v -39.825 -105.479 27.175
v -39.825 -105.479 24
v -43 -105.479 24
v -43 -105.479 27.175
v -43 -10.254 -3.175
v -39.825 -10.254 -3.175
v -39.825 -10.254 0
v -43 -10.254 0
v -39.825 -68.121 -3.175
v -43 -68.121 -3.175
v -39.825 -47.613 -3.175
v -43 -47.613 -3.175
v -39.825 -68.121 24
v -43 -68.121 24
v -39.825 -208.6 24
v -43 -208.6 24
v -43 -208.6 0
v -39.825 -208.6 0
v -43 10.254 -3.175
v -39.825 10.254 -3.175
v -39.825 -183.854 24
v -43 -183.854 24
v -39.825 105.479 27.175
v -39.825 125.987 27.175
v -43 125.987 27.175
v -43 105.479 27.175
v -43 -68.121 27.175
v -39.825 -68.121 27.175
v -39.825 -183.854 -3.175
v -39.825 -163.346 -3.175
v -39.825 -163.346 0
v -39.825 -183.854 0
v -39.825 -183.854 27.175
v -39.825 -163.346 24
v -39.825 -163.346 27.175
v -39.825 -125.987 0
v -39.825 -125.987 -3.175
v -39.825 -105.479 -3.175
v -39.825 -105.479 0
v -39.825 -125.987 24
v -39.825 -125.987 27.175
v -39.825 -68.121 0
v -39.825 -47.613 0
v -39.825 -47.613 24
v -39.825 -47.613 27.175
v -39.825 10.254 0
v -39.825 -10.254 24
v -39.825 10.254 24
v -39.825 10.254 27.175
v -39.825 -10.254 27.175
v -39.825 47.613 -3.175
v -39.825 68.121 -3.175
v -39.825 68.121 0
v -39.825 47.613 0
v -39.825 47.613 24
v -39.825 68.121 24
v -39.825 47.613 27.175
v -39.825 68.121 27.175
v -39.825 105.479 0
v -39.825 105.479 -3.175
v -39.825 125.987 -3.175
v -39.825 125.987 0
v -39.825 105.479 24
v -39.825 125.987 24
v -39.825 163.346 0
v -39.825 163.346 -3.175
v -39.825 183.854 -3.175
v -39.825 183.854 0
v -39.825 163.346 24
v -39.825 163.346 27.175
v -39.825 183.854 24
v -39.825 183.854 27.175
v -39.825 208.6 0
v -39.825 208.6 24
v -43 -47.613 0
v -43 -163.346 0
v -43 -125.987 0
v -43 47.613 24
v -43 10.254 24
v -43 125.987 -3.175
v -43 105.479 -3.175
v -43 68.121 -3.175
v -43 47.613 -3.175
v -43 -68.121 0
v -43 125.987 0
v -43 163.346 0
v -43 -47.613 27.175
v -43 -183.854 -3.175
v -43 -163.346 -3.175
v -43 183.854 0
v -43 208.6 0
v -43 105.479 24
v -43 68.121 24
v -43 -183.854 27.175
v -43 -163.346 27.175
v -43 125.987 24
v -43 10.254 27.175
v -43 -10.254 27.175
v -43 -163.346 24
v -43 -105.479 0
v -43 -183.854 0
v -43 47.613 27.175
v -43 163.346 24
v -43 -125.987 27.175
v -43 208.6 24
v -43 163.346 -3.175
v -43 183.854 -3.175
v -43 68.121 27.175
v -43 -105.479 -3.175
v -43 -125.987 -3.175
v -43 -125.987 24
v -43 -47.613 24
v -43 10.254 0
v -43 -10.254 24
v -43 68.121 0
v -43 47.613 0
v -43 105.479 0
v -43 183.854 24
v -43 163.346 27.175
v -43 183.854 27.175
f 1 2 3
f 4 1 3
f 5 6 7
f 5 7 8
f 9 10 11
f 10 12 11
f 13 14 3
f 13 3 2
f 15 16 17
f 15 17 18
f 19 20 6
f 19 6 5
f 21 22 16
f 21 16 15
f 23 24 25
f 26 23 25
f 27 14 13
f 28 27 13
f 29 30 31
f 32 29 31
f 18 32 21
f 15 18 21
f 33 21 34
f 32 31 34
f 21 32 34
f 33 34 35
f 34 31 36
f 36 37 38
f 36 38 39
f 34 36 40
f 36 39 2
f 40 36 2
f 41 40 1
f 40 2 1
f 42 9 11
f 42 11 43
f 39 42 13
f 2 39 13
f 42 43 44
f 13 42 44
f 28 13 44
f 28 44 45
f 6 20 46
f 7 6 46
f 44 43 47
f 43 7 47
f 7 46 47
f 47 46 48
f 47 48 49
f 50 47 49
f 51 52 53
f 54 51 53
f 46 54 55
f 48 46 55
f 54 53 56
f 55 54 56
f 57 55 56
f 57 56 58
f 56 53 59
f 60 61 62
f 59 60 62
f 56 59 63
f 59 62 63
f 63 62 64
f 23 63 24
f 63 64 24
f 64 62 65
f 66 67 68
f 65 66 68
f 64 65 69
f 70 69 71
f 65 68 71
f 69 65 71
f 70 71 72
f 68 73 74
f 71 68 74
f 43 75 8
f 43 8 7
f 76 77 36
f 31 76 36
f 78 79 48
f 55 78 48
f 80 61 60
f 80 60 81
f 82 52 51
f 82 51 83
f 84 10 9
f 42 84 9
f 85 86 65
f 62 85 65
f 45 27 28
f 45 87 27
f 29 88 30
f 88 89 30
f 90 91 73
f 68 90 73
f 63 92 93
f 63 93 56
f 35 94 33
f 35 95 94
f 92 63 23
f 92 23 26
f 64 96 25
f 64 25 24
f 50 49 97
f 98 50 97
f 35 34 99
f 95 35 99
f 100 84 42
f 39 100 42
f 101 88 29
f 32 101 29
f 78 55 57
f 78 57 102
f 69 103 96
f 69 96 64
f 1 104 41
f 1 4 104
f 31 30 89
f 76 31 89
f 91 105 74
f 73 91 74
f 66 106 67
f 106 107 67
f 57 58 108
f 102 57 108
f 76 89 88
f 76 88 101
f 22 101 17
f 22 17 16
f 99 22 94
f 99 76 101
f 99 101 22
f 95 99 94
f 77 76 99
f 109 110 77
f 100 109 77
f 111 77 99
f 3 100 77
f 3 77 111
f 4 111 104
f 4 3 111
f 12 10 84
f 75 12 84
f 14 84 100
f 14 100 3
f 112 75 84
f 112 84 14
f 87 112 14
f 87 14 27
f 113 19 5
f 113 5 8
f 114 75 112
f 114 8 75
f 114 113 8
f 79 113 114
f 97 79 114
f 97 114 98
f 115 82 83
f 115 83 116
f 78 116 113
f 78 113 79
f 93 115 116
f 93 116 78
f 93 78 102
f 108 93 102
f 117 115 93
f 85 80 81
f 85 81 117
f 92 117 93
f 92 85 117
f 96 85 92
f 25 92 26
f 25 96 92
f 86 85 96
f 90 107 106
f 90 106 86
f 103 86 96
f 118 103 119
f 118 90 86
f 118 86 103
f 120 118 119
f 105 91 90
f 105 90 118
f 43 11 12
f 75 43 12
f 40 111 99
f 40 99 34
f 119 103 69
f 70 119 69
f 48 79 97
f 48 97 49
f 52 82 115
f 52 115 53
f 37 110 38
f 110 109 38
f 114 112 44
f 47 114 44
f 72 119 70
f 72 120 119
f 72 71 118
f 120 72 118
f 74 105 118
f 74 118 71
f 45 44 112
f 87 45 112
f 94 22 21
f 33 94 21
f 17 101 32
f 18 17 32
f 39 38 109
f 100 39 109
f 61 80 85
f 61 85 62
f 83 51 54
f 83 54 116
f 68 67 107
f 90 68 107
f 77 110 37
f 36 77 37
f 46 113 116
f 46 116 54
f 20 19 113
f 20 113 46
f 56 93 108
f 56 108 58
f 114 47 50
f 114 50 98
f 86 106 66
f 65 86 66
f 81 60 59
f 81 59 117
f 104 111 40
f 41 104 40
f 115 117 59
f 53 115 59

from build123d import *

# Parameters (mm, degrees)
BOSS_EXTRU_1_DEPTH        = 27.175
BOSS_EXTRU_1_DEPTH_BACK   = 3.175
BOSS_EXTRU_1_2_DEPTH      = 27.175
BOSS_EXTRU_1_2_DEPTH_BACK = 3.175
BOSS_EXTRU_1_3_DEPTH      = 27.175
BOSS_EXTRU_1_3_DEPTH_BACK = 3.175
BOSS_EXTRU_1_4_DEPTH      = 27.175
BOSS_EXTRU_1_4_DEPTH_BACK = 3.175
BOSS_EXTRU_1_5_DEPTH      = 27.175
BOSS_EXTRU_1_5_DEPTH_BACK = 3.175
BOSS_EXTRU_1_6_DEPTH      = 27.175
BOSS_EXTRU_1_6_DEPTH_BACK = 3.175
BOSS_EXTRU_1_7_DEPTH      = 27.175
BOSS_EXTRU_1_7_DEPTH_BACK = 3.175
BOSS_EXTRU_2_DEPTH        = 198.346
BOSS_EXTRU_2_DEPTH_BACK   = 218.854
ESQUISSE2_W               = 3.175
ESQUISSE2_H               = 24


with BuildPart() as part:
    # Esquisse1 → Boss.-Extru.1 (new, two sides: drawn at the far end of the back side and taken through both)
    with BuildSketch(Plane.XY.offset(-BOSS_EXTRU_1_DEPTH_BACK)):
        Polygon((-43, 163.6), (-43, 163.346), (-39.825, 163.346), (-39.825, 163.6), (-39.825, 183.6), (-39.825, 183.854), (-43, 183.854), (-43, 183.6), align=None)
    extrude(amount=BOSS_EXTRU_1_DEPTH + BOSS_EXTRU_1_DEPTH_BACK)



with BuildPart() as body_2:
    # Esquisse1 → Boss.-Extru.1 2 (new, two sides: drawn at the far end of the back side and taken through both)
    with BuildSketch(Plane.XY.offset(-BOSS_EXTRU_1_2_DEPTH_BACK)):
        Polygon((-43, 125.733333333), (-43, 125.987333333), (-39.825, 125.987333333), (-39.825, 125.733333333), (-39.825, 105.733333333), (-39.825, 105.479333333), (-43, 105.479333333), (-43, 105.733333333), align=None)
    extrude(amount=BOSS_EXTRU_1_2_DEPTH + BOSS_EXTRU_1_2_DEPTH_BACK)


with BuildPart() as body_3:
    # Esquisse1 → Boss.-Extru.1 3 (new, two sides: drawn at the far end of the back side and taken through both)
    with BuildSketch(Plane.XY.offset(-BOSS_EXTRU_1_3_DEPTH_BACK)):
        Polygon((-43, 67.866666667), (-43, 68.120666667), (-39.825, 68.120666667), (-39.825, 67.866666667), (-39.825, 47.866666667), (-39.825, 47.612666667), (-43, 47.612666667), (-43, 47.866666667), align=None)
    extrude(amount=BOSS_EXTRU_1_3_DEPTH + BOSS_EXTRU_1_3_DEPTH_BACK)


with BuildPart() as body_4:
    # Esquisse1 → Boss.-Extru.1 4 (new, two sides: drawn at the far end of the back side and taken through both)
    with BuildSketch(Plane.XY.offset(-BOSS_EXTRU_1_4_DEPTH_BACK)):
        Polygon((-43, 10), (-43, 10.254), (-39.825, 10.254), (-39.825, 10), (-39.825, -10), (-39.825, -10.254), (-43, -10.254), (-43, -10), align=None)
    extrude(amount=BOSS_EXTRU_1_4_DEPTH + BOSS_EXTRU_1_4_DEPTH_BACK)


with BuildPart() as body_5:
    # Esquisse1 → Boss.-Extru.1 5 (new, two sides: drawn at the far end of the back side and taken through both)
    with BuildSketch(Plane.XY.offset(-BOSS_EXTRU_1_5_DEPTH_BACK)):
        Polygon((-43, -163.6), (-43, -183.6), (-43, -183.854), (-39.825, -183.854), (-39.825, -183.6), (-39.825, -163.6), (-39.825, -163.346), (-43, -163.346), align=None)
    extrude(amount=BOSS_EXTRU_1_5_DEPTH + BOSS_EXTRU_1_5_DEPTH_BACK)


with BuildPart() as body_6:
    # Esquisse1 → Boss.-Extru.1 6 (new, two sides: drawn at the far end of the back side and taken through both)
    with BuildSketch(Plane.XY.offset(-BOSS_EXTRU_1_6_DEPTH_BACK)):
        Polygon((-43, -105.733333333), (-43, -125.733333333), (-43, -125.987333333), (-39.825, -125.987333333), (-39.825, -125.733333333), (-39.825, -105.733333333), (-39.825, -105.479333333), (-43, -105.479333333), align=None)
    extrude(amount=BOSS_EXTRU_1_6_DEPTH + BOSS_EXTRU_1_6_DEPTH_BACK)


with BuildPart() as body_7:
    # Esquisse1 → Boss.-Extru.1 7 (new, two sides: drawn at the far end of the back side and taken through both)
    with BuildSketch(Plane.XY.offset(-BOSS_EXTRU_1_7_DEPTH_BACK)):
        Polygon((-43, -47.866666667), (-43, -67.866666667), (-43, -68.120666667), (-39.825, -68.120666667), (-39.825, -67.866666667), (-39.825, -47.866666667), (-39.825, -47.612666667), (-43, -47.612666667), align=None)
    extrude(amount=BOSS_EXTRU_1_7_DEPTH + BOSS_EXTRU_1_7_DEPTH_BACK)


with BuildPart() as part_1:
    add(part.part)

    add(body_2.part)  # Boss.-Extru.2 merges body 2

    add(body_3.part)  # Boss.-Extru.2 merges body 3

    add(body_4.part)  # Boss.-Extru.2 merges body 4

    add(body_5.part)  # Boss.-Extru.2 merges body 5

    add(body_6.part)  # Boss.-Extru.2 merges body 6

    add(body_7.part)  # Boss.-Extru.2 merges body 7
    # Esquisse2 → Boss.-Extru.2 (add, two sides: drawn at the far end of the back side and taken through both)
    with BuildSketch(Plane.XZ.offset(10.254).offset(-BOSS_EXTRU_2_DEPTH_BACK)):
        with Locations((-41.4125, 12)):
            Rectangle(ESQUISSE2_W, ESQUISSE2_H)
    extrude(amount=BOSS_EXTRU_2_DEPTH + BOSS_EXTRU_2_DEPTH_BACK)


solid = part_1.part
